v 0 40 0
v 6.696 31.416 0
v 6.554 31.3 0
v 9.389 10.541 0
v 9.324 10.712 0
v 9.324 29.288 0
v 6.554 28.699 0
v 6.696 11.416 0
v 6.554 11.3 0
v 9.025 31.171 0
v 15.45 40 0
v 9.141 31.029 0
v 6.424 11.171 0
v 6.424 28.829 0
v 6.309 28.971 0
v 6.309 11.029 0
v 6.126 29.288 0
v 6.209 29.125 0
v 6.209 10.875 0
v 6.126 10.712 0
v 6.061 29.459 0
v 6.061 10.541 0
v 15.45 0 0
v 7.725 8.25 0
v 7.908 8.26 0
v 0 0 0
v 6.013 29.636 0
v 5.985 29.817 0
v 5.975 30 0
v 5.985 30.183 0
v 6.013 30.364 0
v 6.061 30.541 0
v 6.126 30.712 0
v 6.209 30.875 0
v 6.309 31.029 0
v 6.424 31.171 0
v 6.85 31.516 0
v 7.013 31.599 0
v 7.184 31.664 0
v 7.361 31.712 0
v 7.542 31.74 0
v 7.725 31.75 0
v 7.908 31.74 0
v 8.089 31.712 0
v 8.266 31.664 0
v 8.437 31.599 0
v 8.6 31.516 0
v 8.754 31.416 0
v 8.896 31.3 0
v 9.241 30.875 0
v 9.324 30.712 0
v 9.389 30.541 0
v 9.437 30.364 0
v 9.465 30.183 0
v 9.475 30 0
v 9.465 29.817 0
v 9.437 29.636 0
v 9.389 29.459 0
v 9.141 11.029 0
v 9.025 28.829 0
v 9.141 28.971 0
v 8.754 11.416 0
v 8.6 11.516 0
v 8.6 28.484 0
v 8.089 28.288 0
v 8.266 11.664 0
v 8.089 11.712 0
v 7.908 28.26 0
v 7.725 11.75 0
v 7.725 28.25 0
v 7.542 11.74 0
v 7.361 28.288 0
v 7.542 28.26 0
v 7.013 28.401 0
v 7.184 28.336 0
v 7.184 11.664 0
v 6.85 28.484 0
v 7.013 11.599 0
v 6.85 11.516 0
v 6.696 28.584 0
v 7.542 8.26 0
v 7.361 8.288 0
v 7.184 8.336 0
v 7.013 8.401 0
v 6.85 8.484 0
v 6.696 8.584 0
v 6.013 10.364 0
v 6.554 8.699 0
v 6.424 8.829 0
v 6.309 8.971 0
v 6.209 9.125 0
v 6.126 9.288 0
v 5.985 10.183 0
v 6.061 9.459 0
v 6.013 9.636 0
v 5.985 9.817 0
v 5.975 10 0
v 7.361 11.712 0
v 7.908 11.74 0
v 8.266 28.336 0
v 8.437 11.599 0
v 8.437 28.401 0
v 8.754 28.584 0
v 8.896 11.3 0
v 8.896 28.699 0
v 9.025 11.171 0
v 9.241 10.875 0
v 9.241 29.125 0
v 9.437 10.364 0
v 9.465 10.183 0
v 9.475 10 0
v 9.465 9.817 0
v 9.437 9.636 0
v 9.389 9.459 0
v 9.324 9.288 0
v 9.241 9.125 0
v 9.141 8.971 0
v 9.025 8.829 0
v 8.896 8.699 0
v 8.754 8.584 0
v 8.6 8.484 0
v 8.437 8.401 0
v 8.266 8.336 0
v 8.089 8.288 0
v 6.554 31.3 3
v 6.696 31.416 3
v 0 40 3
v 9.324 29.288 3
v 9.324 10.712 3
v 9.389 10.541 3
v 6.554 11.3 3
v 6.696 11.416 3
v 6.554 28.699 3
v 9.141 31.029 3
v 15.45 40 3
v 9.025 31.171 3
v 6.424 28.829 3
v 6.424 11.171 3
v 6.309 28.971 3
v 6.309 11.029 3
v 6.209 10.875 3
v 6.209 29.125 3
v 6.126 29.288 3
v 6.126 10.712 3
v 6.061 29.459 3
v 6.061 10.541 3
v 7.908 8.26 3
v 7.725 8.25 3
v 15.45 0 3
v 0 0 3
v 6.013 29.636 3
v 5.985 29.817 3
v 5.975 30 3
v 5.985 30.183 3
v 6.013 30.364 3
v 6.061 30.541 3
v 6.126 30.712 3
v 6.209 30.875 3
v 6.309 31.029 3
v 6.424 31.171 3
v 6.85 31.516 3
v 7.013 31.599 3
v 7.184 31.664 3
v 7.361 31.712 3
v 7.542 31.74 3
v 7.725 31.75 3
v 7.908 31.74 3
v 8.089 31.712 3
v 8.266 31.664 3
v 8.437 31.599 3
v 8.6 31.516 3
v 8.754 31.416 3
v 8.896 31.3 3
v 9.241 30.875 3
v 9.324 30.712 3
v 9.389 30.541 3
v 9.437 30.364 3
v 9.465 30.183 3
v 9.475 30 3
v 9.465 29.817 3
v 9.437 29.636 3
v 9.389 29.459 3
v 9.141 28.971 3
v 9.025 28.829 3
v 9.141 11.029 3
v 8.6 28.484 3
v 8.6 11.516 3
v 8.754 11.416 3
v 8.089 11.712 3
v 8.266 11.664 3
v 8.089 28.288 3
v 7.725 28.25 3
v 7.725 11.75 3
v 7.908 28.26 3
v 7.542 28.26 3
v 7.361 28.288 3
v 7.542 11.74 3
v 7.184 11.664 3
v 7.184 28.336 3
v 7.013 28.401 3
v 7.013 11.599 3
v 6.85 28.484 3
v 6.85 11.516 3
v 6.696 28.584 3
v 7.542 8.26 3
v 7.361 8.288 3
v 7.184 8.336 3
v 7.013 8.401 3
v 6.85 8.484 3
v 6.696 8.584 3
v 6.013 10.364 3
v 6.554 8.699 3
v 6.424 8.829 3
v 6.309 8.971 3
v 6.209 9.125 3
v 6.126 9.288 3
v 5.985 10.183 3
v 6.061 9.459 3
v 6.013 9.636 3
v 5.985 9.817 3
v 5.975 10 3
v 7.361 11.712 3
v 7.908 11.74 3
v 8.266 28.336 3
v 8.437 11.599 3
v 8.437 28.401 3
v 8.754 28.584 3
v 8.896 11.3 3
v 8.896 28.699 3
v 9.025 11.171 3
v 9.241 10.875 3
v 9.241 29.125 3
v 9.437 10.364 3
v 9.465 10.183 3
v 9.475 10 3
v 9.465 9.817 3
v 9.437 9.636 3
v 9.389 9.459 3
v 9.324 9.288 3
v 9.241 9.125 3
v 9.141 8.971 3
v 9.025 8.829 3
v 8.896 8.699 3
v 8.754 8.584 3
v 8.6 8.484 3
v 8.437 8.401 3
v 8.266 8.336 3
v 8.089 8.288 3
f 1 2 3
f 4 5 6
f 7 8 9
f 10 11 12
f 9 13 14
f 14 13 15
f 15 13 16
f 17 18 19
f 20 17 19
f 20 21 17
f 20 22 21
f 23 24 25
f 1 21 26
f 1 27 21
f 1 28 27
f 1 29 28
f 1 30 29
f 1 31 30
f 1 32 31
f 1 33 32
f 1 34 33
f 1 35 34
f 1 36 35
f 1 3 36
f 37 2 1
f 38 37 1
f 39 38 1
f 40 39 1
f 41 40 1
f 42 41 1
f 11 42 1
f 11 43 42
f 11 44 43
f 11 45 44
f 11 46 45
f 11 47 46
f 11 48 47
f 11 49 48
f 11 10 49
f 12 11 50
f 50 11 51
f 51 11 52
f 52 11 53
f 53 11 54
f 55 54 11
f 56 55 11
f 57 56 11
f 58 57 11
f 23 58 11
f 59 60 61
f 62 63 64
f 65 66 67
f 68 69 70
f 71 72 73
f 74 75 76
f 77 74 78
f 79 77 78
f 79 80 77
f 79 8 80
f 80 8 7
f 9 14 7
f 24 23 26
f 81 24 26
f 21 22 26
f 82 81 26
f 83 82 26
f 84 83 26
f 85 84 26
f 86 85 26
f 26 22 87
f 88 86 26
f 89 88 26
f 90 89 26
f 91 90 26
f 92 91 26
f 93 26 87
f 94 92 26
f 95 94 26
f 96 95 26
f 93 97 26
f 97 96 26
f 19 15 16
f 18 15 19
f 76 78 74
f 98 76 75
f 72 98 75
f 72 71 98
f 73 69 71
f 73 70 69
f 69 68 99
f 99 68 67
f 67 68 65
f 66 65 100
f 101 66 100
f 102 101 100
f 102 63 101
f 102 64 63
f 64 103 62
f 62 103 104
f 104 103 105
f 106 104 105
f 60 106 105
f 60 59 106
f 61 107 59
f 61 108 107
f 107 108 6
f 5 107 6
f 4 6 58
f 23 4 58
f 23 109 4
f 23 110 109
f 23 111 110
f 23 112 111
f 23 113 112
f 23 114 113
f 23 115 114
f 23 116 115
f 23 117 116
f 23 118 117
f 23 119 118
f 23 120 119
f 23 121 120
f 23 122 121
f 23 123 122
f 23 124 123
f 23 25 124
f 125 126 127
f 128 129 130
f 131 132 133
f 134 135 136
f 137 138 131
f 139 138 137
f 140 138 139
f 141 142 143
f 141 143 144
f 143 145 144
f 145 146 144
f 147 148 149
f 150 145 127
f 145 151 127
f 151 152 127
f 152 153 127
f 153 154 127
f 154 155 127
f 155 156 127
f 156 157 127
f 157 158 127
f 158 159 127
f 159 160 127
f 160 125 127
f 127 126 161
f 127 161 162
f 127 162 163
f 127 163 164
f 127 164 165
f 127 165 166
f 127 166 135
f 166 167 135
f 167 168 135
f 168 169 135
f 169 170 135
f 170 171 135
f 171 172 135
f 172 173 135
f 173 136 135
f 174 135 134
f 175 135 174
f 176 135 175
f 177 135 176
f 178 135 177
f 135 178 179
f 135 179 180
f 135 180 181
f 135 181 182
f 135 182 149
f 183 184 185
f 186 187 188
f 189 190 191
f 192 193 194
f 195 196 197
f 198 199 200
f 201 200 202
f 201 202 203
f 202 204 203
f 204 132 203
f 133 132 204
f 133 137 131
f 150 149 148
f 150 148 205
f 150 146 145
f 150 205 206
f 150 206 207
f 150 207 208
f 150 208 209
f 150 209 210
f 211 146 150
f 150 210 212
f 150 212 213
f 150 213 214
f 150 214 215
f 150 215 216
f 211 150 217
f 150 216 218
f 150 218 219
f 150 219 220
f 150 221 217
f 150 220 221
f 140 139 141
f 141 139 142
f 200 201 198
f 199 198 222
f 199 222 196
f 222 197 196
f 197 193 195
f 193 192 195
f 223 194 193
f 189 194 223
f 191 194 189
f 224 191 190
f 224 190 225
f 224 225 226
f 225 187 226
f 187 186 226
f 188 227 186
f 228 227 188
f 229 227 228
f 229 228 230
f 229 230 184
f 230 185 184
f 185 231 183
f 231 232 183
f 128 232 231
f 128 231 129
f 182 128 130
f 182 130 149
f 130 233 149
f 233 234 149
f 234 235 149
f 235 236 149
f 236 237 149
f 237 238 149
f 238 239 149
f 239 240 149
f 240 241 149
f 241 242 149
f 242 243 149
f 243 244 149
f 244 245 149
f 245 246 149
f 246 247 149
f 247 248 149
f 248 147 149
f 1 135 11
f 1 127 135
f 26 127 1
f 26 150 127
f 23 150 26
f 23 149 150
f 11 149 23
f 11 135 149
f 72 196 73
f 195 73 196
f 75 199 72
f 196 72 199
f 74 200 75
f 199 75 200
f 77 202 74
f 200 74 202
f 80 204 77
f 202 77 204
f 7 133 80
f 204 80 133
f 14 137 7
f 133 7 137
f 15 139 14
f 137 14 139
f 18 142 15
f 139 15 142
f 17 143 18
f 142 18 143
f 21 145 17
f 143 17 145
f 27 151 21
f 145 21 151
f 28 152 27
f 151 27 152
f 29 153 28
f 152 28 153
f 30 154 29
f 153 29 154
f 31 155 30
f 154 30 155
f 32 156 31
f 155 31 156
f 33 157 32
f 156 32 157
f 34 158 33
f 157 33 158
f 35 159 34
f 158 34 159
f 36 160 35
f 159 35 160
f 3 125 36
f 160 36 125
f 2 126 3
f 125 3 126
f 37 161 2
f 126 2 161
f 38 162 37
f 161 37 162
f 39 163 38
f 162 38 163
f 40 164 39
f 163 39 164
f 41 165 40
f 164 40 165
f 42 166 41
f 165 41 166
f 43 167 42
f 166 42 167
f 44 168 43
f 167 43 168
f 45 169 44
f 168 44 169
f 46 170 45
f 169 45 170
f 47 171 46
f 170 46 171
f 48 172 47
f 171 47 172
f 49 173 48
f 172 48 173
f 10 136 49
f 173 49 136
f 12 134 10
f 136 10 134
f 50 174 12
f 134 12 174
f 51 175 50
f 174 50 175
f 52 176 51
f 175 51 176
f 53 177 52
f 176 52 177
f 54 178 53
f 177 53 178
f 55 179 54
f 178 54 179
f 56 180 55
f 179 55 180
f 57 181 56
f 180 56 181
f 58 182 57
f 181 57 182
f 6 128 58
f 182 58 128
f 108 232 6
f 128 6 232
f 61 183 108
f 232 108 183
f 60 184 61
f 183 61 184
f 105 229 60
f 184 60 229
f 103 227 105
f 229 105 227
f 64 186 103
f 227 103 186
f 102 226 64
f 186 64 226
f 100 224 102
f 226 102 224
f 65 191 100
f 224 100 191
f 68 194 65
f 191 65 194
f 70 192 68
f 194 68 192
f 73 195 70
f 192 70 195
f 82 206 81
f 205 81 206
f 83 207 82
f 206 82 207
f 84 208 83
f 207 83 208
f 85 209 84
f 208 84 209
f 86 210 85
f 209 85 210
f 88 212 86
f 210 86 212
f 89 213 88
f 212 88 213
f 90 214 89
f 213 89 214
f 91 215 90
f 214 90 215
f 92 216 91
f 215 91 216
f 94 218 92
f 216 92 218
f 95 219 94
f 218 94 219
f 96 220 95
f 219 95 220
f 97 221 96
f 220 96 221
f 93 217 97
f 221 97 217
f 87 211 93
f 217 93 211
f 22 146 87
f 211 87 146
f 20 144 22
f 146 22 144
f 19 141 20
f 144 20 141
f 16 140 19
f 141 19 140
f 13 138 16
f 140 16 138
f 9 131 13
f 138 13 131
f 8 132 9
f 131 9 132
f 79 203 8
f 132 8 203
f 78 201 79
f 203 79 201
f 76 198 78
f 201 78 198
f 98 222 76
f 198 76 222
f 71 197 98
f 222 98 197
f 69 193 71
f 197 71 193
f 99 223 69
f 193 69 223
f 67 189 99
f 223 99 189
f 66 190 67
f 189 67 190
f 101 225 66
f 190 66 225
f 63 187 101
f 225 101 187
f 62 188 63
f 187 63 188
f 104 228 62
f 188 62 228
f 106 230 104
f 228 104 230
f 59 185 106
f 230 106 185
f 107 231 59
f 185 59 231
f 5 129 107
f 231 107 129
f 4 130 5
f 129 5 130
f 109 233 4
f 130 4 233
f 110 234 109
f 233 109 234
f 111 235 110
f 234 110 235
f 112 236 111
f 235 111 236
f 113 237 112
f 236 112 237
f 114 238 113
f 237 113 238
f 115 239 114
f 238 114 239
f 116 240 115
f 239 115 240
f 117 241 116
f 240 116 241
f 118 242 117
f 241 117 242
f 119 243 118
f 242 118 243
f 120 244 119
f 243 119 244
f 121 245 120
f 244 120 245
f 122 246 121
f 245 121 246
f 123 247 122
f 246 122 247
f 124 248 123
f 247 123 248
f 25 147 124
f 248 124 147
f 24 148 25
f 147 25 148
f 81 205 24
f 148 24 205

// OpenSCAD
width=15.45;
height=40;
thick=3;
first_screw_offset=10;
screw_spacing=20;
num_screw_holes=2;
screw_hole_diameter=3.5;


linear_extrude(thick)
   sketch(); 

module sketch() {
  $fn=60;
  difference() {
    square([width,height], false);
    for(i=[0:num_screw_holes-1]) {
      translate([width/2, first_screw_offset+ (i*screw_spacing), 0])
        circle(d=screw_hole_diameter);
    }
  }
}
